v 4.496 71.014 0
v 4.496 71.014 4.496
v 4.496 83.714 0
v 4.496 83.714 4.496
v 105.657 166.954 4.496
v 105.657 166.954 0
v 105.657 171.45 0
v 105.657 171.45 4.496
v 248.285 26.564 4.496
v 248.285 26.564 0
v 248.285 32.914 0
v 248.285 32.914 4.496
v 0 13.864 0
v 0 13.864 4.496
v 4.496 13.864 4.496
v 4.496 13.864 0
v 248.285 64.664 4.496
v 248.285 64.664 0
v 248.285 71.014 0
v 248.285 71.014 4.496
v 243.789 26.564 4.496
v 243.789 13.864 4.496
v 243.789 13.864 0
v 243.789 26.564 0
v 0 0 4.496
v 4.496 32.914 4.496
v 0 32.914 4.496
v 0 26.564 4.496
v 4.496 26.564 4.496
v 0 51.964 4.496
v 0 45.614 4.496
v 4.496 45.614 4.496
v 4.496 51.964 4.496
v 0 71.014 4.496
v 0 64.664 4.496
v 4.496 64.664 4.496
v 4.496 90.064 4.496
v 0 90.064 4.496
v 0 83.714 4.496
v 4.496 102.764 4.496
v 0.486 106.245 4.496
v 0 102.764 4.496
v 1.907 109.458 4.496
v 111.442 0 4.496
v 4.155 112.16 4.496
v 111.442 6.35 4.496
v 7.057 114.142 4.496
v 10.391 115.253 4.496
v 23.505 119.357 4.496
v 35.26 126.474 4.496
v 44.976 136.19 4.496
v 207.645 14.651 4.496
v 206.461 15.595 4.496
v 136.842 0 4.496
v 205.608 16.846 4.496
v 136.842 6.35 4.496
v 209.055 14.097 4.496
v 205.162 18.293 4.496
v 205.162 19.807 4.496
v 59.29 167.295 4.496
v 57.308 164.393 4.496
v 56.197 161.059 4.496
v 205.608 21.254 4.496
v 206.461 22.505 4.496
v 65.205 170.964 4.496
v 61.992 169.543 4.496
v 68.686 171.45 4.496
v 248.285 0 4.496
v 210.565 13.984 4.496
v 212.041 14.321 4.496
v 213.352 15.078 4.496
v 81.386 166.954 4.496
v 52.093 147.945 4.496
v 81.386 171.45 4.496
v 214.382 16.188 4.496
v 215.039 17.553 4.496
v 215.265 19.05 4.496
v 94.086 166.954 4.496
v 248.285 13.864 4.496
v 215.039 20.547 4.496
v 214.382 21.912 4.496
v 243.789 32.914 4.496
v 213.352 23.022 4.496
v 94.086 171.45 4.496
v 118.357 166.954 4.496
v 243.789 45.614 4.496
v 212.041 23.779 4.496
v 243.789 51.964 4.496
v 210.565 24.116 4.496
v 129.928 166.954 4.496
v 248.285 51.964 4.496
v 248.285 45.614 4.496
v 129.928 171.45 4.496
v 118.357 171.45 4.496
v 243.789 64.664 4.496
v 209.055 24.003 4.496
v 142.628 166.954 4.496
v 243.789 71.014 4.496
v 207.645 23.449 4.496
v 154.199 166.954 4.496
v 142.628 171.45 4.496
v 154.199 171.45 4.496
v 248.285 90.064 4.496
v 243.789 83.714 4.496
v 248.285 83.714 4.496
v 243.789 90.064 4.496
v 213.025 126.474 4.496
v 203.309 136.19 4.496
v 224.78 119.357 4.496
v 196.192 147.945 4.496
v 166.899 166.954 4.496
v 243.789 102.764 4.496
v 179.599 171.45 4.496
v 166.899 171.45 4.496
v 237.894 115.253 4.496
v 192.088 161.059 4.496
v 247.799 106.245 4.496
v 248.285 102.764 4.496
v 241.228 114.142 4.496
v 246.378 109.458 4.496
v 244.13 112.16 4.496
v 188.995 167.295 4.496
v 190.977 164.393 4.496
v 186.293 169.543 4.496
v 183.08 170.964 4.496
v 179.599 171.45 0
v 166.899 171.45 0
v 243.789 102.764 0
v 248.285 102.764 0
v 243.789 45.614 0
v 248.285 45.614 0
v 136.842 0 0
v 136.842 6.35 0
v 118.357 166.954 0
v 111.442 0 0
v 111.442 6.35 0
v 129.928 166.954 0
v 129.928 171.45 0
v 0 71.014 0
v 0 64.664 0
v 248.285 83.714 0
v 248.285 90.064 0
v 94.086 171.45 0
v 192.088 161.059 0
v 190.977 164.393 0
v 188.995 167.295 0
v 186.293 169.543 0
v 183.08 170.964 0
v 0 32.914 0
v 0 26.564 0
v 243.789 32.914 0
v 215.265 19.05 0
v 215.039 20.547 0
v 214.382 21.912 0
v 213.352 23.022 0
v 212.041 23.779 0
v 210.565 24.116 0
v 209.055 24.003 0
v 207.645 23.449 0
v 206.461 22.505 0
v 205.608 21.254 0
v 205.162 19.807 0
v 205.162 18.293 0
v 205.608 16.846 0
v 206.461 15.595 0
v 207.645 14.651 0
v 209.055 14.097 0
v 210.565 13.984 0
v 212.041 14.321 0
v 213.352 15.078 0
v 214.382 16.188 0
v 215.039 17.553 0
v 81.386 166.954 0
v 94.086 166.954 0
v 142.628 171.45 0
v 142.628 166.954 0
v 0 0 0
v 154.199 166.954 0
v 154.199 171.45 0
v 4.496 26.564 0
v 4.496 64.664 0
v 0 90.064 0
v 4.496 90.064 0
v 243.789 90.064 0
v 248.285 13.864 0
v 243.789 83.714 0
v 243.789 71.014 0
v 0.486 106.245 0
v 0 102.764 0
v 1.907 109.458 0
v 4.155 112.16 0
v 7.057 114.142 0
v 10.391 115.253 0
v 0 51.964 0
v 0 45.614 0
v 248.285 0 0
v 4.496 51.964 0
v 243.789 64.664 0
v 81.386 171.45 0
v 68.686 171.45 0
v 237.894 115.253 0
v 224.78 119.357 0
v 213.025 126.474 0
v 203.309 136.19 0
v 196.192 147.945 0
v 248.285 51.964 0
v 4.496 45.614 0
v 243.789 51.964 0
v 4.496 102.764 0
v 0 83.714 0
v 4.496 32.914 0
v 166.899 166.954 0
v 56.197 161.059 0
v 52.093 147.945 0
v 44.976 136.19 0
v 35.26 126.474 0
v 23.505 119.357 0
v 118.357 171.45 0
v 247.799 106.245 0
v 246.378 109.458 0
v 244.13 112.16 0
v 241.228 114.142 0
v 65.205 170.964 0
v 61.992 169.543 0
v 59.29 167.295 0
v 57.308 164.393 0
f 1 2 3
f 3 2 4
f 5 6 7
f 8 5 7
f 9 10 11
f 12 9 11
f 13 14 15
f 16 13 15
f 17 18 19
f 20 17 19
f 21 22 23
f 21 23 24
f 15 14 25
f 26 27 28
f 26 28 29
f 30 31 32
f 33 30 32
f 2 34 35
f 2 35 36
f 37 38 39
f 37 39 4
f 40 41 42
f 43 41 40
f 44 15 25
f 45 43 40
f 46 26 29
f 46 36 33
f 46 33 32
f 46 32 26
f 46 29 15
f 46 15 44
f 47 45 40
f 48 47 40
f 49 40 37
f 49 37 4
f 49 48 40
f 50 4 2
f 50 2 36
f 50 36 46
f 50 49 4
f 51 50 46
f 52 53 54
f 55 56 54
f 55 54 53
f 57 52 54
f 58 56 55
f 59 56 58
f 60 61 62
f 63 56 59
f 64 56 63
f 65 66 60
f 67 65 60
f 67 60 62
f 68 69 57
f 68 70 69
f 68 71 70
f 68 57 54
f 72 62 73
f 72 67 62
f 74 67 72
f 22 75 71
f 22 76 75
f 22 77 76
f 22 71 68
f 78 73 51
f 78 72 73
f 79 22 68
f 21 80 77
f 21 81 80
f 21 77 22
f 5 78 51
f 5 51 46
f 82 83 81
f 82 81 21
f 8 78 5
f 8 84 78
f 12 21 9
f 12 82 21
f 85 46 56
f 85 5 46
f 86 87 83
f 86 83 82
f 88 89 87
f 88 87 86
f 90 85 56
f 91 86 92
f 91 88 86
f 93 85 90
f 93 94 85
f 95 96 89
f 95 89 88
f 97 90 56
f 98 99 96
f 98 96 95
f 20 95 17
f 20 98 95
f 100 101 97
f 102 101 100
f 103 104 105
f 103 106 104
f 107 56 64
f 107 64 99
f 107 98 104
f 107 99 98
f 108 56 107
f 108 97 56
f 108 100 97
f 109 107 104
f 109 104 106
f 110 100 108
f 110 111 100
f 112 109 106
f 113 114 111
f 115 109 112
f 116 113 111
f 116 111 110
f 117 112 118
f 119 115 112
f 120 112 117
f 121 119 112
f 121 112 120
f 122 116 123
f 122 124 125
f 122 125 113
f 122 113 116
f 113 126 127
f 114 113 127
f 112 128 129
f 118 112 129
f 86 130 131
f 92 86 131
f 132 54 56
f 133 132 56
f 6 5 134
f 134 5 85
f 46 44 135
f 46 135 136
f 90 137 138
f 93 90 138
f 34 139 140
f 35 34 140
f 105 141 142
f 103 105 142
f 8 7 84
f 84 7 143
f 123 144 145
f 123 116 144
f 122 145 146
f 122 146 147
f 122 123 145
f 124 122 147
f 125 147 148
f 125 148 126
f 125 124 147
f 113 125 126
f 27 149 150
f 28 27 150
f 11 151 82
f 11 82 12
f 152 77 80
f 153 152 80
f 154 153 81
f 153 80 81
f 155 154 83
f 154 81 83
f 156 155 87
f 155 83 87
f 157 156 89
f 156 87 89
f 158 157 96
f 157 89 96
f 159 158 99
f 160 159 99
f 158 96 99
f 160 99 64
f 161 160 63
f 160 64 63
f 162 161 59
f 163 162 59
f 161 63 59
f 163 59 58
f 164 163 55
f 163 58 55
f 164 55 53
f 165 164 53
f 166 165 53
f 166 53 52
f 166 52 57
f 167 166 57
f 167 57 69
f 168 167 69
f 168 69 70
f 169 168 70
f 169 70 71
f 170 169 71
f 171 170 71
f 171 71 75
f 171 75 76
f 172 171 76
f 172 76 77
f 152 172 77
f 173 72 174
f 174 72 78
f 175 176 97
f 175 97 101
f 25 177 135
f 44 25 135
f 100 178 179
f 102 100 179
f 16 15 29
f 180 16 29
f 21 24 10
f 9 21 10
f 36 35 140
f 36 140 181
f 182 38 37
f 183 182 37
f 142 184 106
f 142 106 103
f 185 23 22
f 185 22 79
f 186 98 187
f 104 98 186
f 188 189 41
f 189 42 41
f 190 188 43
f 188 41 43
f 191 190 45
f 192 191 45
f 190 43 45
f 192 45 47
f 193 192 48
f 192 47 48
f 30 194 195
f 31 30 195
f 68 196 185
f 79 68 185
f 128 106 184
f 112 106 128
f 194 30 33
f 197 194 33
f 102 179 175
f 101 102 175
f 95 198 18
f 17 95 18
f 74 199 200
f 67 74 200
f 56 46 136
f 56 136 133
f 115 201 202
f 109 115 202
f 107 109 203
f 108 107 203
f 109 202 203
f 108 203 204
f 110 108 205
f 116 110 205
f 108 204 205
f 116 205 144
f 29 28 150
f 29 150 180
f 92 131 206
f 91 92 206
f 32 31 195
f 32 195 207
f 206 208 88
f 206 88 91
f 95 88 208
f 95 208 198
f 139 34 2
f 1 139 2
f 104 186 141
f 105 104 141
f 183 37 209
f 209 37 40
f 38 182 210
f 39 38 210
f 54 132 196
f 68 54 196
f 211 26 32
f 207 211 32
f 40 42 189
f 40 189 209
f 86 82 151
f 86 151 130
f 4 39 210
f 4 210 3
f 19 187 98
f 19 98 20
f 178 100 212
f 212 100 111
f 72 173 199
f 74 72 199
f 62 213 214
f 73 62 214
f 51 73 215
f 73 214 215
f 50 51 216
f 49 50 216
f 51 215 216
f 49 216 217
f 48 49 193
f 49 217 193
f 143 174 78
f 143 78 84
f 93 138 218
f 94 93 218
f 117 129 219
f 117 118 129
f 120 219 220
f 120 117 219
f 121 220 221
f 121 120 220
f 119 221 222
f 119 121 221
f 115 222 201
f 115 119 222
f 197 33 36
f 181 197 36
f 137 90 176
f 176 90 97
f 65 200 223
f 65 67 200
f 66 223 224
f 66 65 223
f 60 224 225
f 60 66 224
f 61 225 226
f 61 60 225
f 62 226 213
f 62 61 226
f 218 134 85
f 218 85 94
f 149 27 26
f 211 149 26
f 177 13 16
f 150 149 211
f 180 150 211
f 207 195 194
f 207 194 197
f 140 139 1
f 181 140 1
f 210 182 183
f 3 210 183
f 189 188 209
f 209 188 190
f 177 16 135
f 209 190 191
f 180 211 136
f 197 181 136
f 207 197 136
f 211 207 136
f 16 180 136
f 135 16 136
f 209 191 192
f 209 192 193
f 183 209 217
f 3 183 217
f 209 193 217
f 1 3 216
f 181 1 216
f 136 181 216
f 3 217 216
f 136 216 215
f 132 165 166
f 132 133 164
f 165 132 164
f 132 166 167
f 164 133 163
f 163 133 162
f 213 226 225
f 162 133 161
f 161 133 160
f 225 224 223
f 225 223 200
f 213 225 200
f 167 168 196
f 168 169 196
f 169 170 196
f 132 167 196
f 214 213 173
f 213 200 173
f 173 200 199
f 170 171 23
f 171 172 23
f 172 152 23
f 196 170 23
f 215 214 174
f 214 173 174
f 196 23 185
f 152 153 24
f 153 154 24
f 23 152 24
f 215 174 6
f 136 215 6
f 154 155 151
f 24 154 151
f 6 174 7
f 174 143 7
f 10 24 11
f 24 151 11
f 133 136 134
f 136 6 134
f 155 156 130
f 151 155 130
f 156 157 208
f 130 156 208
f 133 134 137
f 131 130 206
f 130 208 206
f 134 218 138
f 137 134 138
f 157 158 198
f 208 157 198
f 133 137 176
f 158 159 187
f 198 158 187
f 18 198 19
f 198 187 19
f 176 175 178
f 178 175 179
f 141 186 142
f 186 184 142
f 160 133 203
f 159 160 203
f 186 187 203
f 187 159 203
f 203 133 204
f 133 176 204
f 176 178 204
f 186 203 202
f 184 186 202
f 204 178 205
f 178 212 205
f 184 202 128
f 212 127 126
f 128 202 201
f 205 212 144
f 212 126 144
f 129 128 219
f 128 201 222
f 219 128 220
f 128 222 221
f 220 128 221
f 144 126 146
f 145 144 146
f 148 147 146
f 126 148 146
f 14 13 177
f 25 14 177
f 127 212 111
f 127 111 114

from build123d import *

# Parameters (mm, degrees)
BOSS_EXTRUDE1_DEPTH = 4.4958
FILLET1_R           = 12.7
SKETCH2_W           = 4.4958
SKETCH2_H           = 12.7
CUT_EXTRUDE1_DEPTH  = 302.762747772
SKETCH3_W           = 12.7
SKETCH3_H           = 4.4958
CUT_EXTRUDE2_DEPTH  = 302.762747772
SKETCH4_R           = 5.08
CUT_EXTRUDE3_DEPTH  = 302.762747772
SKETCH5_W           = 25.4
SKETCH5_H           = 6.35
CUT_EXTRUDE4_DEPTH  = 302.762747772


with BuildPart() as part:
    # Sketch1 → Boss-Extrude1 (new body)
    with BuildSketch(Plane.XY):
        with BuildLine():
            Line((0, 114.3), (0, 0))
            Line((0, 0), (248.285, 0))
            Line((248.285, 0), (248.285, 114.3))
            ThreePointArc((248.285, 114.3), (207.873847455, 131.038847455), (191.135, 171.45))
            Line((191.135, 171.45), (57.15, 171.45))
            ThreePointArc((57.15, 171.45), (40.411152545, 131.038847455), (0, 114.3))
        make_face()
    extrude(amount=BOSS_EXTRUDE1_DEPTH)

    # Fillet1
    fillet1_edges = [part.edges().sort_by_distance(p)[0] for p in [
        (248.285, 114.3, 2.2479),
        (0, 114.3, 2.2479),
        (57.15, 171.45, 2.2479),
        (191.135, 171.45, 2.2479),
    ]]
    fillet(fillet1_edges, radius=FILLET1_R)

    # Sketch2 → Cut-Extrude1 (cut, through all)
    with BuildSketch(Plane.XY.offset(4.4958)):
        with Locations((246.0371, 96.414248202)):
            Rectangle(SKETCH2_W, SKETCH2_H)
        with Locations((246.0371, 77.364248202)):
            Rectangle(SKETCH2_W, SKETCH2_H)
        with Locations((246.0371, 39.264248202)):
            Rectangle(SKETCH2_W, SKETCH2_H)
        with Locations((246.0371, 58.314248202)):
            Rectangle(SKETCH2_W, SKETCH2_H)
        with Locations((246.0371, 20.214248202)):
            Rectangle(SKETCH2_W, SKETCH2_H)
        with Locations((2.2479, 96.414248202)):
            Rectangle(SKETCH2_W, SKETCH2_H)
        with Locations((2.2479, 77.364248202)):
            Rectangle(SKETCH2_W, SKETCH2_H)
        with Locations((2.2479, 58.314248202)):
            Rectangle(SKETCH2_W, SKETCH2_H)
        with Locations((2.2479, 39.264248202)):
            Rectangle(SKETCH2_W, SKETCH2_H)
        with Locations((2.2479, 20.214248202)):
            Rectangle(SKETCH2_W, SKETCH2_H)
    extrude(amount=-CUT_EXTRUDE1_DEPTH, mode=Mode.SUBTRACT)

    # Sketch3 → Cut-Extrude2 (cut, through all)
    with BuildSketch(Plane.XY.offset(4.4958)):
        with Locations((112.006917266, 169.2021)):
            Rectangle(SKETCH3_W, SKETCH3_H)
        with Locations((87.735751798, 169.2021)):
            Rectangle(SKETCH3_W, SKETCH3_H)
        with Locations((136.278082734, 169.2021)):
            Rectangle(SKETCH3_W, SKETCH3_H)
        with Locations((160.549248202, 169.2021)):
            Rectangle(SKETCH3_W, SKETCH3_H)
    extrude(amount=-CUT_EXTRUDE2_DEPTH, mode=Mode.SUBTRACT)

    # Sketch4 → Cut-Extrude3 (cut, through all)
    with BuildSketch(Plane.XY.offset(4.4958)):
        with Locations((210.185, 19.05)):
            Circle(SKETCH4_R)
    extrude(amount=-CUT_EXTRUDE3_DEPTH, mode=Mode.SUBTRACT)

    # Sketch5 → Cut-Extrude4 (cut, through all)
    with BuildSketch(Plane.XY.offset(4.4958)):
        with Locations((124.1425, 3.175)):
            Rectangle(SKETCH5_W, SKETCH5_H)
    extrude(amount=-CUT_EXTRUDE4_DEPTH, mode=Mode.SUBTRACT)


solid = part.part
